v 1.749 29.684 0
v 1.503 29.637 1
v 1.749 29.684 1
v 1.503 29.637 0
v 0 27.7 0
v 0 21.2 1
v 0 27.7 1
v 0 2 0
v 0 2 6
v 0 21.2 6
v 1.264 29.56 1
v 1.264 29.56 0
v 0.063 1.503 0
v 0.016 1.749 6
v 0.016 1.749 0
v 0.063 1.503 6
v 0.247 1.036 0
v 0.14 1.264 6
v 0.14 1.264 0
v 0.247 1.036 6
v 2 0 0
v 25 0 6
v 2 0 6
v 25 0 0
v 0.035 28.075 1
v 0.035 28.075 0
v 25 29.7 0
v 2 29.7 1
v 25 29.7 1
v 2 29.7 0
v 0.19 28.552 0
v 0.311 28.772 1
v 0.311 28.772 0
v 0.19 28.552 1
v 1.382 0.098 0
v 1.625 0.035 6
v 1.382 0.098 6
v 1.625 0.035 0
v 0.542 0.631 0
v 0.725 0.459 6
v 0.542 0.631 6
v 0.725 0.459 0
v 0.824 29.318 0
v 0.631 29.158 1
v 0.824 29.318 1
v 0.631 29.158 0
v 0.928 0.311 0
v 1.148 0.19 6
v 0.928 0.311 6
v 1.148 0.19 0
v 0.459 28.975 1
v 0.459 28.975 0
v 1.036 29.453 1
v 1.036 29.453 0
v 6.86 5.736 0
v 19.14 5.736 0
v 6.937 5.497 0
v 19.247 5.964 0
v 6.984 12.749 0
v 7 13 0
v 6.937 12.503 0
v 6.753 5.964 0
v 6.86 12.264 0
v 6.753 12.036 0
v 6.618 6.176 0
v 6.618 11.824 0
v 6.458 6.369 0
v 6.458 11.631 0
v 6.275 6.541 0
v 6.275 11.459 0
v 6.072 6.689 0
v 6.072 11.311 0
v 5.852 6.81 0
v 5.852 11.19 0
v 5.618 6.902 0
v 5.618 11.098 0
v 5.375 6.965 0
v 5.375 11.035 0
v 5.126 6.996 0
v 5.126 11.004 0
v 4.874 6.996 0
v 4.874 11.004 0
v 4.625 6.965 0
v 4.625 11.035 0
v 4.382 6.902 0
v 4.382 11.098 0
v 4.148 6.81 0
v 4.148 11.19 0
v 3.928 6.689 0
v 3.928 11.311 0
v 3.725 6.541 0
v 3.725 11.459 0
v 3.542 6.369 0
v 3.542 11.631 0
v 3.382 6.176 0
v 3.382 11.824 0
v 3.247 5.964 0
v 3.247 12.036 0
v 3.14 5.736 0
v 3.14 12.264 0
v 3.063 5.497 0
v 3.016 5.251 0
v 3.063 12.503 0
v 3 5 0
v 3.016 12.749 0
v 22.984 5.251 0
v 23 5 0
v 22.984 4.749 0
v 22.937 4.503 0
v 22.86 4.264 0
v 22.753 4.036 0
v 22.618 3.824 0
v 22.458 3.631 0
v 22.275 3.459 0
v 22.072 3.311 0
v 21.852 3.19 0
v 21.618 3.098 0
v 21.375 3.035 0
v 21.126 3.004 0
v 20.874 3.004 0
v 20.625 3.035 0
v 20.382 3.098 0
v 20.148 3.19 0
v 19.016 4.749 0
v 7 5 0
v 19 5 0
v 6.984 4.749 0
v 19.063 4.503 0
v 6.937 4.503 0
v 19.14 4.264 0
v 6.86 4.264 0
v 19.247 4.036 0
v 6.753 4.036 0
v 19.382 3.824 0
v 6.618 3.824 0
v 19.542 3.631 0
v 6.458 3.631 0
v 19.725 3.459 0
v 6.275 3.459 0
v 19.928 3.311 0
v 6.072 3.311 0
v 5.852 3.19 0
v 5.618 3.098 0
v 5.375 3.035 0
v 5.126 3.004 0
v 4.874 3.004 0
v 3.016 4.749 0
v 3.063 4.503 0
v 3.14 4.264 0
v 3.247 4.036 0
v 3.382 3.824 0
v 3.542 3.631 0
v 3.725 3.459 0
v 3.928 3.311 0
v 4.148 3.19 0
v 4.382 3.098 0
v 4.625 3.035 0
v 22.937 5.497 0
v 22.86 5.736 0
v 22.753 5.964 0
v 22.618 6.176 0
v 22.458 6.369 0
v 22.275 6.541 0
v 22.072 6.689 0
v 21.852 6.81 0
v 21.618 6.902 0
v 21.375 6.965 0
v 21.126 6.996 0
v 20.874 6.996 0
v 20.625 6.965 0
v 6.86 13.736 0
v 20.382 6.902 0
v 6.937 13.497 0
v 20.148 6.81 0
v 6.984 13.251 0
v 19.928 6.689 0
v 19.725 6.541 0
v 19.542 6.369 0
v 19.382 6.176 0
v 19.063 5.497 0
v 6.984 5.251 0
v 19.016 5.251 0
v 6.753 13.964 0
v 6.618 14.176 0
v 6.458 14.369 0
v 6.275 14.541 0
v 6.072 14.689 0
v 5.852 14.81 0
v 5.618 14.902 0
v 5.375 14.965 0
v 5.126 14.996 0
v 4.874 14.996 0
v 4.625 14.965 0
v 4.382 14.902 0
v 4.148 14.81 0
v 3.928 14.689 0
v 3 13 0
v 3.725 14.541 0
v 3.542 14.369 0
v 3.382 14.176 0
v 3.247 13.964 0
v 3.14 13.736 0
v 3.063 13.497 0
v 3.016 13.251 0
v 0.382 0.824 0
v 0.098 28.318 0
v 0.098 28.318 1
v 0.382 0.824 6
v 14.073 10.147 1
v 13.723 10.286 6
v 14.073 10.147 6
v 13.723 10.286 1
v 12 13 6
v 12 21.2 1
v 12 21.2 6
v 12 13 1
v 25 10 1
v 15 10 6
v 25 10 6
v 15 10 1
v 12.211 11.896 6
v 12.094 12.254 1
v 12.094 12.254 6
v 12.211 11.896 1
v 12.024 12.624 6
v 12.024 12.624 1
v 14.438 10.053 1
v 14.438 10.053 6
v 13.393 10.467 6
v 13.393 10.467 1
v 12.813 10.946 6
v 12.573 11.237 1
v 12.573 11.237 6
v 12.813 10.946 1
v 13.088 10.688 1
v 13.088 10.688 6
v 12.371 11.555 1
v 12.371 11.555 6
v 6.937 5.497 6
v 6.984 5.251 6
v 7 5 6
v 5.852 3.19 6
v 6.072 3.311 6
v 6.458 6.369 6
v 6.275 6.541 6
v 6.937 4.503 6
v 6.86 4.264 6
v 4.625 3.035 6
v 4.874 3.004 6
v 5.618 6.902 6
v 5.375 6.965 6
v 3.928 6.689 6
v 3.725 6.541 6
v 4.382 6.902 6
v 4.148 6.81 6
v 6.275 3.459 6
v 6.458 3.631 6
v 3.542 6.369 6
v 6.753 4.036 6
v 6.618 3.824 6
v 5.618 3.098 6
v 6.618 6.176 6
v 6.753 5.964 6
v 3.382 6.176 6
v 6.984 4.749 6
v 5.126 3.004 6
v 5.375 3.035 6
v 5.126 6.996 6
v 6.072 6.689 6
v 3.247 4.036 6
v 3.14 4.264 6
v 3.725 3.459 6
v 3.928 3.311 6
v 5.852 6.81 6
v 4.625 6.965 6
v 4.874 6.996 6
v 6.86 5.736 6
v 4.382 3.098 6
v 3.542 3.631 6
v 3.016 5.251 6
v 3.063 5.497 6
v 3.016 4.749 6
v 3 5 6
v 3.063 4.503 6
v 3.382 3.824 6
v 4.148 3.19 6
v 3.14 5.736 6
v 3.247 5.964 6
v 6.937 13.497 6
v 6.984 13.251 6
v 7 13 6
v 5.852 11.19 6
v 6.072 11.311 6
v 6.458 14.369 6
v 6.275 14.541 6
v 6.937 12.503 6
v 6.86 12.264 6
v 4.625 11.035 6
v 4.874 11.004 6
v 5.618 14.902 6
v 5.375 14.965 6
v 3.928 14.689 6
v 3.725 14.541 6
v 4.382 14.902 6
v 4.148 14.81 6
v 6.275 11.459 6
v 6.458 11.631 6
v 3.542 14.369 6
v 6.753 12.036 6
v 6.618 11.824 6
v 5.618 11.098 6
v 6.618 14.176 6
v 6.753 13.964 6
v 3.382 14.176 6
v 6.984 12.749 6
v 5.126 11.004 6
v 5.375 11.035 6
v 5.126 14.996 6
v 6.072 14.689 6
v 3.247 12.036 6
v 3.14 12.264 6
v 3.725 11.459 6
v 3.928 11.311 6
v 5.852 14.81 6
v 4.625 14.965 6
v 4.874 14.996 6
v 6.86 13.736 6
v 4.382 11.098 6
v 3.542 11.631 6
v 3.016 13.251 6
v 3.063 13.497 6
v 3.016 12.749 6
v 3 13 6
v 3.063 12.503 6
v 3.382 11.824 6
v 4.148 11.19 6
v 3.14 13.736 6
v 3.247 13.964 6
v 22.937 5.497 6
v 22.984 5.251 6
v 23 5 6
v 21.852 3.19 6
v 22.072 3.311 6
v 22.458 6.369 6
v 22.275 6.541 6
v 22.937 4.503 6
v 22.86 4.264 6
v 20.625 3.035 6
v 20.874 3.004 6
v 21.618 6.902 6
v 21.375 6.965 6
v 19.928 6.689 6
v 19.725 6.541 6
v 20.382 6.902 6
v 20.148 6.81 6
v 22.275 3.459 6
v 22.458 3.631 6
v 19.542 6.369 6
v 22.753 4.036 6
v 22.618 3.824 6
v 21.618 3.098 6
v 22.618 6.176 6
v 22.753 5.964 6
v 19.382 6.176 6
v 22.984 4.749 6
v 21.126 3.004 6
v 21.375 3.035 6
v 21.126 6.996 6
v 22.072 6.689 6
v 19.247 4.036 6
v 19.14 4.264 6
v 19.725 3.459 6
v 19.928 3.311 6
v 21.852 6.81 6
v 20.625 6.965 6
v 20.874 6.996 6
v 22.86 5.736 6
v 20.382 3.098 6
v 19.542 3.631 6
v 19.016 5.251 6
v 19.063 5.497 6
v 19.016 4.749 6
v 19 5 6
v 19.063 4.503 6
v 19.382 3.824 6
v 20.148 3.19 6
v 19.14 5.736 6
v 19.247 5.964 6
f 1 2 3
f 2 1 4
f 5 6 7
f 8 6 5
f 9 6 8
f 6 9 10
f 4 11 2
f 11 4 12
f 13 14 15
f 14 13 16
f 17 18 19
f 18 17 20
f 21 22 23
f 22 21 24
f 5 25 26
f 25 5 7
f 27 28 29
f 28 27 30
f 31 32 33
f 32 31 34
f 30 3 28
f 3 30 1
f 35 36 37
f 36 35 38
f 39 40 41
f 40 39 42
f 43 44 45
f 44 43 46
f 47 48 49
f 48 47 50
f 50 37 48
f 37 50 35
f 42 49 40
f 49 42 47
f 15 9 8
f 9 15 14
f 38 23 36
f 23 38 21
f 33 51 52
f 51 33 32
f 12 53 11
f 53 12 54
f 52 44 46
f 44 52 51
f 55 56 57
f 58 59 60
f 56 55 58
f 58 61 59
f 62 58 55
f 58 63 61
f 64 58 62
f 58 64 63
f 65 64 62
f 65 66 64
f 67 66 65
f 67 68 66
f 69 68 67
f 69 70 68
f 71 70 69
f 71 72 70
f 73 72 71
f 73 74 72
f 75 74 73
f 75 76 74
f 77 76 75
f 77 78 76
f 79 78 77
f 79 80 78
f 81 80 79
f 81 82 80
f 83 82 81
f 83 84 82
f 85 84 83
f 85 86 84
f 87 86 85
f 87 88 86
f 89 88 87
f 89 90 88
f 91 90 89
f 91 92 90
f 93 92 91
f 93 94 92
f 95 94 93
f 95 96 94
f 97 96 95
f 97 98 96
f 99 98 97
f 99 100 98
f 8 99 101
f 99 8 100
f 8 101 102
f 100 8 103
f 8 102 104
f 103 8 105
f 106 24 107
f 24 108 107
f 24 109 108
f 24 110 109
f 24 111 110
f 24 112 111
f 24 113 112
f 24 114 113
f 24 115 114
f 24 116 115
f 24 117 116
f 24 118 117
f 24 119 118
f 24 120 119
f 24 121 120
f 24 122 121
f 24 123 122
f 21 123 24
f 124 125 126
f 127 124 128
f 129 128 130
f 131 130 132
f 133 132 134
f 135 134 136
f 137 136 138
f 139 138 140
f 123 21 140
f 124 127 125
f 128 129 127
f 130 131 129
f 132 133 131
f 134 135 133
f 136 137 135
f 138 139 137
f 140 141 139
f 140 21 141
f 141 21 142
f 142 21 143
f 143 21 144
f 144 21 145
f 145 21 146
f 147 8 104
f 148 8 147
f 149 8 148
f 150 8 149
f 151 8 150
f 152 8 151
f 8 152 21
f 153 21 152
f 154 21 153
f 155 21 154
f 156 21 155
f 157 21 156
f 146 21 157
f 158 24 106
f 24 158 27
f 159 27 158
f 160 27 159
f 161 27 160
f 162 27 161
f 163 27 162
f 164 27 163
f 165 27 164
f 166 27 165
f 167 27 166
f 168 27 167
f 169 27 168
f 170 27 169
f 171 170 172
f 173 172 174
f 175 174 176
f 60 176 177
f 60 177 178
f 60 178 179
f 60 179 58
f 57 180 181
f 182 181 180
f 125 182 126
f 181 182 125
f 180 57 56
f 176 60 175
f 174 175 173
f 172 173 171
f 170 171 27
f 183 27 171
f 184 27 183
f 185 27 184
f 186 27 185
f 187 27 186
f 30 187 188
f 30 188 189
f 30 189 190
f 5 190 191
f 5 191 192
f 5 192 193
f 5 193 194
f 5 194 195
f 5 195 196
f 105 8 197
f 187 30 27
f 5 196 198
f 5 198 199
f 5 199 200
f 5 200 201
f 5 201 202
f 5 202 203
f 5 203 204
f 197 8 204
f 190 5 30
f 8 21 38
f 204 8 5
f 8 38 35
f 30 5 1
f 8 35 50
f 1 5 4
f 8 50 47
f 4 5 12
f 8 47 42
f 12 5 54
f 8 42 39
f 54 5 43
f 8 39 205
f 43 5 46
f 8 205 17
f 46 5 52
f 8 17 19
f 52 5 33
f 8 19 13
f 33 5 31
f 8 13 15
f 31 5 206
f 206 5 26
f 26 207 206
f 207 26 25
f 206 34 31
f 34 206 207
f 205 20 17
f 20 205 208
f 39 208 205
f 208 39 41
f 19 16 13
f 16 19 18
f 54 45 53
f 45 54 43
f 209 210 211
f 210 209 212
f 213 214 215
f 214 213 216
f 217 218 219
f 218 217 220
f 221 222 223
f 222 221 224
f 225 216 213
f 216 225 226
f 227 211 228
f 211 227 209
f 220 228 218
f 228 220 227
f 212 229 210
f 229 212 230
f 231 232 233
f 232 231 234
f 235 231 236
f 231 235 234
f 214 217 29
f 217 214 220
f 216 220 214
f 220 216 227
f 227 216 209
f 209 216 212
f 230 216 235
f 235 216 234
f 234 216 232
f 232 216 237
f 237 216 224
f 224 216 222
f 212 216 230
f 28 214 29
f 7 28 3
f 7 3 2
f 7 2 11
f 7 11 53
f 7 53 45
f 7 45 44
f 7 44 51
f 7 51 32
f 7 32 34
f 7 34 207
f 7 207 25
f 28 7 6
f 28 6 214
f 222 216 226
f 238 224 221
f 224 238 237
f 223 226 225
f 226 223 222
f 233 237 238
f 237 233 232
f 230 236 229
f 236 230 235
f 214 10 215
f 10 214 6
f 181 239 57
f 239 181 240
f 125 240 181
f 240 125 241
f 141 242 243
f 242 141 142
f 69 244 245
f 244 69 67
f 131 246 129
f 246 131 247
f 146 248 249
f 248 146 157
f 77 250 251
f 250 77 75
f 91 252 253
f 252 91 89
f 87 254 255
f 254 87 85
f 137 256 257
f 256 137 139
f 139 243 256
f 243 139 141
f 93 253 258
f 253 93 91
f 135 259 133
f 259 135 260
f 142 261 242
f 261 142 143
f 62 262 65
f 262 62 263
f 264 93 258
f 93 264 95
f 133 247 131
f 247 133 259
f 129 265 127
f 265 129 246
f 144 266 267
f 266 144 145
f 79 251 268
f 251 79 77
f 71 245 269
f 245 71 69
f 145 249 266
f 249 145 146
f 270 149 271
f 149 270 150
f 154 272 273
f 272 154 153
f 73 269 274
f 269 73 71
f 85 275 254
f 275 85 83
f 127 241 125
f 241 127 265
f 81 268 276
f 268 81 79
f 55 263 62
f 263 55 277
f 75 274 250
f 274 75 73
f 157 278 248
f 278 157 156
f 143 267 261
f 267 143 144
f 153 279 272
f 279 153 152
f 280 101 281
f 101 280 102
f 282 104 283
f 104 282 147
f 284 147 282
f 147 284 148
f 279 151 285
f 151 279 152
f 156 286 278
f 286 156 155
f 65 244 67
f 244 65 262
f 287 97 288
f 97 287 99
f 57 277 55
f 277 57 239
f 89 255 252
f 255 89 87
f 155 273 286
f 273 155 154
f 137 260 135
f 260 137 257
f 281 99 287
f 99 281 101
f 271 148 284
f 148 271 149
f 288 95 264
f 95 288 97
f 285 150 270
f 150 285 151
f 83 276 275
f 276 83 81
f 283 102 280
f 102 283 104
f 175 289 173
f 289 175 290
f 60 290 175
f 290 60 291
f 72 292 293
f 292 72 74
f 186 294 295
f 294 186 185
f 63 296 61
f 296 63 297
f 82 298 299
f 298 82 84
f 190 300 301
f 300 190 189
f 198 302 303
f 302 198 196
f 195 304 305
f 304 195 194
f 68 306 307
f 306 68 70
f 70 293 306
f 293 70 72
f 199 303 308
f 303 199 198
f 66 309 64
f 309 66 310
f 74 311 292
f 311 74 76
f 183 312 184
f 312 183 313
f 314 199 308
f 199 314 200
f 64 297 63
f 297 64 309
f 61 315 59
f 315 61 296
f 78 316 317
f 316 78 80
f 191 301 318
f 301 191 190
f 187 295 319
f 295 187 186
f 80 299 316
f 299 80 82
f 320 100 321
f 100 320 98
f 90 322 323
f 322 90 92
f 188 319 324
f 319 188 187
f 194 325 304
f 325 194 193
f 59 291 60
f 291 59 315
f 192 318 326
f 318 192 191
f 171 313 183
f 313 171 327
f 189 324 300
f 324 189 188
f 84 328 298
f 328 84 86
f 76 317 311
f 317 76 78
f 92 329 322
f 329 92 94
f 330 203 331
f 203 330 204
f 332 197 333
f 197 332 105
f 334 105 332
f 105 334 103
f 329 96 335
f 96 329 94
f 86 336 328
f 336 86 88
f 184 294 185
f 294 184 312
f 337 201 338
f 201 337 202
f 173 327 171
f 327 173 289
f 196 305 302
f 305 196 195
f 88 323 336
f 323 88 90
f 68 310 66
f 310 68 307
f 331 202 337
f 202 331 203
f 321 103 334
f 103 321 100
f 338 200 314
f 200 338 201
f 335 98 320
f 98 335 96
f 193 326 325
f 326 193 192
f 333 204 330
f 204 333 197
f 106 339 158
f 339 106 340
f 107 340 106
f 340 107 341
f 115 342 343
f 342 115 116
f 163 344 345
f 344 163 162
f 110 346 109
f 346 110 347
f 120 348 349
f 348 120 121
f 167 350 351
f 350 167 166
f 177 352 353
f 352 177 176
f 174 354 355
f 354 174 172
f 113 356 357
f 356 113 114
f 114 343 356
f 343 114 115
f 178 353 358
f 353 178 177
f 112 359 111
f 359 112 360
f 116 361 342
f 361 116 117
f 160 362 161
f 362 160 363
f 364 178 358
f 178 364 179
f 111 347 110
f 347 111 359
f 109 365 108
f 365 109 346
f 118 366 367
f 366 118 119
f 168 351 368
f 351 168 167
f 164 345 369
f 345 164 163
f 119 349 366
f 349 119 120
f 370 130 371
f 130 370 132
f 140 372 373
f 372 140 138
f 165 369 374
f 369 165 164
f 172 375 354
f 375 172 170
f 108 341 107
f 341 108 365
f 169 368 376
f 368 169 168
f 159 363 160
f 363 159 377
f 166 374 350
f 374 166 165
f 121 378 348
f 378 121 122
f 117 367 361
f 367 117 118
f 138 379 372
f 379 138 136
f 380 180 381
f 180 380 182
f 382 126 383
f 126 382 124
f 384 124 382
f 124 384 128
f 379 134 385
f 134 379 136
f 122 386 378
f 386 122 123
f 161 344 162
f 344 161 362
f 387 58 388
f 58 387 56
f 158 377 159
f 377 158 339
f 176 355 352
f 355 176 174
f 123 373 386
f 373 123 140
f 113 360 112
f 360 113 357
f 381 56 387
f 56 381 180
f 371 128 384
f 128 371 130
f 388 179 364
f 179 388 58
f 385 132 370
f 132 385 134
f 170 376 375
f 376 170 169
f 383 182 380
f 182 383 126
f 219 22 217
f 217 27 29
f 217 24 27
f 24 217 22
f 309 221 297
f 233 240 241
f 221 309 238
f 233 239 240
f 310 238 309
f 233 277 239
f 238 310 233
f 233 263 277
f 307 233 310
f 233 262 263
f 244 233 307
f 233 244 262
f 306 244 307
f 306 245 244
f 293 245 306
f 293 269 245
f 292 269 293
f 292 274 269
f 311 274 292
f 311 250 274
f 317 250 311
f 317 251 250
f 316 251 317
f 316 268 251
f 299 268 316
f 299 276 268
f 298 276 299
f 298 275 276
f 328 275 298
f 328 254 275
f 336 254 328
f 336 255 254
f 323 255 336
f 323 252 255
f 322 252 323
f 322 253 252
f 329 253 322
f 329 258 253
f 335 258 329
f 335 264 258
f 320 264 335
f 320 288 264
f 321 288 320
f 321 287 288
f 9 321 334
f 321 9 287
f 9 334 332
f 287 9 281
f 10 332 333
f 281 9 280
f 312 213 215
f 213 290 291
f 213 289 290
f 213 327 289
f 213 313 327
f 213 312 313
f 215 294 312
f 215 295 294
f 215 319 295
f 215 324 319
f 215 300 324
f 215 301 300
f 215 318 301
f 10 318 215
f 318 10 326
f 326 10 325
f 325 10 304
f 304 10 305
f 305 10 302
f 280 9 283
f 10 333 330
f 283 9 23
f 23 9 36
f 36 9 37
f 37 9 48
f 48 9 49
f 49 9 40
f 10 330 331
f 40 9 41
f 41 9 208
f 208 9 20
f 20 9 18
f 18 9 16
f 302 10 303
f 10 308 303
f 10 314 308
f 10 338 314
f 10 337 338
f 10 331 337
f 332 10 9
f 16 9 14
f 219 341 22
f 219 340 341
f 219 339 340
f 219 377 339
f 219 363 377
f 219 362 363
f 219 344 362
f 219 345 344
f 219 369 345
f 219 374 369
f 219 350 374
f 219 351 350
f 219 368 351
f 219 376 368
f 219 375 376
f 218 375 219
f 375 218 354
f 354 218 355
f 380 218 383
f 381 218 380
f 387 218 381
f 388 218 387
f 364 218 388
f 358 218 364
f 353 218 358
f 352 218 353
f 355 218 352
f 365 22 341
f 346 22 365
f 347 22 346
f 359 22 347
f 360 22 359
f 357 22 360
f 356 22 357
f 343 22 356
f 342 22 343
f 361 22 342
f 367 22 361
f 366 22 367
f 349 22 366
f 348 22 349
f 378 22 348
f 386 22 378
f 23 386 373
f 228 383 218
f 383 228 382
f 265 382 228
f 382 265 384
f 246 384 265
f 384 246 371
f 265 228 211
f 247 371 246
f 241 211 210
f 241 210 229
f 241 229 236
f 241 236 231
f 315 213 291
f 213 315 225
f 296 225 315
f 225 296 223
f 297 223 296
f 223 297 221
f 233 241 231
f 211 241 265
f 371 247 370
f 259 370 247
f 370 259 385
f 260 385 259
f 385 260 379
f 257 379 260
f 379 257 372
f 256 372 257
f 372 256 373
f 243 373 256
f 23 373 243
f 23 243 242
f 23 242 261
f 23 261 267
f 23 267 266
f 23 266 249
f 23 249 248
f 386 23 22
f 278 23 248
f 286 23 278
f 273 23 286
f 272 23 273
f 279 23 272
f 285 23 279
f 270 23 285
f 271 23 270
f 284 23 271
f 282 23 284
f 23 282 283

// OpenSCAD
// file: ../common/extrusions.scad
//
// Common extrusions
// Author: Joseph M. Joy FTC 12598 mentor
//
EPSILON = 0.01; // For moving things to properly punch out holes

// Makes a flat (horizontal) "T":
//
// --------------
// |wtXht     --|
// ----\     /---
//      |wbX|
//      |hb |
//      -----
//<xoff>
//
// It could also be an inverted L shape
// if the lower (vertical) bar is wide enough to extend beyond the right 
// hand side of the upper (horizontal) bar.
//
// {xoff} is horizontal distance to the start of the bar.
// {ro} curve of convex corners (not shown above)
// {ri} is the radius of two concave curves
// curve shown as diagonals above.
// t is the thickness of the plate - in
// the z direction.
// Origin is the left hand corner
// of the bounding rectangle.
//
// WARNING: If {ro} and {ri} are too large it will generate sharp
// extrusion artifacts because the straight surfaces are not large to accomodate
// the inner-radius curves.
// 
module T_channelOld(wb, hb, wt, ht, xoff, r, t) {
    ow = 2*wt; // wide enough to 
    oh = 2*(hb+ht); // high enough to descend below the shape

    difference() {
        cube([wt, hb+ht, t]);
        translate([xoff-ow,hb-oh,-EPSILON]) oblong(ow, oh, r, t+2*EPSILON);
        translate([xoff+wb,hb-oh,-EPSILON]) oblong(ow, oh, r, t+2*EPSILON);
    }
}


module T_channel(wb, hb, wt, ht, xoff, ro, ri, t) {
    
    // ow and oh are used to create cutout patterns
    ow = 2*wt; // wide enough to extend to the left and right of shape
    oh = 2*(hb+ht); // high enough to descend below the shape
    
    // Dimensions of the plate that will be cut out - it is just
    // big enough so that the inner-radii can be cut out, no more.
    wp = wb + 2*ri + 2*EPSILON; // dimensions of plate to be cut out
    hp = max(ro, ri) + 2*EPSILON;
    xoffp = xoff - ri - EPSILON;
    yoffp = hb - max(ro, ri) - EPSILON;
    difference() {
        translate([xoffp, yoffp, 0]) cube([wp, hp, t]);
        translate([xoff-ow,hb-oh,-EPSILON]) oblong(ow, oh, ri, t+2*EPSILON);
        translate([xoff+wb,hb-oh,-EPSILON]) oblong(ow, oh, ri, t+2*EPSILON);
    }
    translate([xoff, 0, 0]) oblong(wb, hb, ro, t);
    translate([0, hb, 0]) oblong(wt, ht, ro, t);
}


// Makes a flat (horizontal) "O":
//
// /-------------\
// |             |
// | /--------\  |
// | |         | |
// | |         | |
// | |         | |
// | \         / |
// |  ---------  |
// \------------/
//
//
// It could also be a U or L
// if the oblong hole extends outside the outer
// boundary.
//
// ({xoff},{yoff} is origin of bounding-rectangle of the oblong hole
// {(wo}, {ho}) is the bounding box of the outer oblong.
// {(wi}, {hi}) is the bounding box of the inner (hole) oblong.
// {r} is the radius of the
// curve shown as diagonals above.
// t is the thickness of the plate - in
// the z direction.
// Origin is the left hand corner
// of the bounding rectangle.
// 
module O_channel(wo, ho, wi, hi, xoff, yoff, ro, ri, t) {
    difference() {
        oblong(wo, ho, ro, t);
        translate([xoff, yoff, -EPSILON]) oblong(wi, hi, ri, t+2*EPSILON);
    }
}


// A rectangular prism that fits within {w} x {h} and
// has rounded corners with radius {r} on all 4 sides.
// The actual radius may be reduced so keep the oblong
// viable. {t} is the thickness (in z).
module oblong(w, h, r, t) {
    r = min(r, w/2-EPSILON, h/2-EPSILON);
    translate([r, r, 0])
    linear_extrude(height = t, center = false, convexity = 10) {
        offset(r = r) square([w-2*r, h-2*r]);
    }
}

// A cube that fits within ({w}, {h}, {d}) and has
// all corners rounded with radius r.
module rounded_cube(w, h, d, r) {
        r =  min(r, w/2-EPSILON, h/2-EPSILON, d/2-EPSILON);
        di = 2*r;
    translate([r, r, r]) {
        minkowski() {
            echo(di);
            cube([w-di, h-di, d-di]);
            sphere(r=r);
        }
    }
}

//
// Example code
//
wb = 10;
hb = 20;
wt = 40;
ht = 30;
t = 5;
ro = 5;
ri = 2;
xoff = 10;
move = 30;
$fn = 50;
oblong(wb, hb, ro, t);
translate([0, move, 0]) rounded_cube(wb, hb, t, ro);//, $fn=100);
translate([move, 0, 0]) T_channel(wb, hb, wt, ht, xoff, 5, 1, t);
translate([move, 2*move, 0]) O_channel(wt, hb+ht, wb, 10*hb, xoff, xoff, ro, ri, t);
// main file
//
// Enclosure for the larger limit switch, such as this one:
// "Cylewet V-154-1C25 Micro Limit Switch"
//
use <../common/extrusions.scad>
base_thick = 1;
switch_thick = 8;
LARGE = 100;
EPSILON = 0.1;

module switch_base() {
    base_w = 50;
    switch_w = 28 + 0.2;
    switch_d = 16 + 0.2;
    switch_h = 10 + 0.5; // for sticky tape or wire
    switch_off_d0 = 8;
    switch_off_w = 12;
    switch_r = 3;
    top_gap_w = switch_off_w + 18.5;
    top_gap_d = 5;
    top_wall_thick = 3.5;
    hole_dist_x = 16;
    hole_dist_y = 8;
    hole_wall_thick = 3;
    hole_r = 2; // enough for 3/32 (imperial) screws
    top_of_top_hole = 2*hole_wall_thick + hole_r + hole_dist_y + hole_r;
    bot_hole_check = 2*hole_wall_thick + 2*hole_r;
    top_hole_check = top_of_top_hole - (switch_d  - top_gap_d);
    //switch_off_d = max(switch_off_d0, bot_hole_check, top_hole_check);
    switch_off_d = max(switch_off_d0, bot_hole_check);

    bottom_gap_w = switch_off_w + 14;
    bottom_gap_d = switch_off_d + 11;     
    base_d = switch_off_d + switch_d + top_wall_thick;
    tot_thick = base_thick + switch_thick;
    hole1_x = hole_wall_thick + hole_r;
    hole1_y = hole_wall_thick + hole_r;

    ro = 2;
    difference() {
        oblong(base_w, base_d, ro, tot_thick);
        translate([switch_off_w, switch_off_d, base_thick]) 
            oblong(switch_w, switch_d, switch_r, LARGE);
        translate([-EPSILON, switch_off_d + switch_d - top_gap_d, base_thick])
            cube([top_gap_w+EPSILON, LARGE, LARGE]);
        translate([bottom_gap_w, -EPSILON, base_thick])
            cube([LARGE, bottom_gap_d + 2*EPSILON, LARGE]);
        translate([hole1_x, hole1_y, -EPSILON])
            cylinder(r=hole_r, h=LARGE);
        translate([hole1_x, hole1_y + hole_dist_y, -EPSILON])
            cylinder(r=hole_r, h=LARGE);
        translate([hole1_x  + hole_dist_x, hole1_y, -EPSILON])
            cylinder(r=hole_r, h=LARGE);
    }
}

module trial() {
    difference() {
        switch_base();
        translate([25, -EPSILON, -EPSILON]) cube([LARGE, LARGE, LARGE]);
        translate([-EPSILON, -EPSILON, base_thick + 5]) cube([LARGE, LARGE, LARGE]);
    }
}

$fn = 50;
//switch_base();
trial();
